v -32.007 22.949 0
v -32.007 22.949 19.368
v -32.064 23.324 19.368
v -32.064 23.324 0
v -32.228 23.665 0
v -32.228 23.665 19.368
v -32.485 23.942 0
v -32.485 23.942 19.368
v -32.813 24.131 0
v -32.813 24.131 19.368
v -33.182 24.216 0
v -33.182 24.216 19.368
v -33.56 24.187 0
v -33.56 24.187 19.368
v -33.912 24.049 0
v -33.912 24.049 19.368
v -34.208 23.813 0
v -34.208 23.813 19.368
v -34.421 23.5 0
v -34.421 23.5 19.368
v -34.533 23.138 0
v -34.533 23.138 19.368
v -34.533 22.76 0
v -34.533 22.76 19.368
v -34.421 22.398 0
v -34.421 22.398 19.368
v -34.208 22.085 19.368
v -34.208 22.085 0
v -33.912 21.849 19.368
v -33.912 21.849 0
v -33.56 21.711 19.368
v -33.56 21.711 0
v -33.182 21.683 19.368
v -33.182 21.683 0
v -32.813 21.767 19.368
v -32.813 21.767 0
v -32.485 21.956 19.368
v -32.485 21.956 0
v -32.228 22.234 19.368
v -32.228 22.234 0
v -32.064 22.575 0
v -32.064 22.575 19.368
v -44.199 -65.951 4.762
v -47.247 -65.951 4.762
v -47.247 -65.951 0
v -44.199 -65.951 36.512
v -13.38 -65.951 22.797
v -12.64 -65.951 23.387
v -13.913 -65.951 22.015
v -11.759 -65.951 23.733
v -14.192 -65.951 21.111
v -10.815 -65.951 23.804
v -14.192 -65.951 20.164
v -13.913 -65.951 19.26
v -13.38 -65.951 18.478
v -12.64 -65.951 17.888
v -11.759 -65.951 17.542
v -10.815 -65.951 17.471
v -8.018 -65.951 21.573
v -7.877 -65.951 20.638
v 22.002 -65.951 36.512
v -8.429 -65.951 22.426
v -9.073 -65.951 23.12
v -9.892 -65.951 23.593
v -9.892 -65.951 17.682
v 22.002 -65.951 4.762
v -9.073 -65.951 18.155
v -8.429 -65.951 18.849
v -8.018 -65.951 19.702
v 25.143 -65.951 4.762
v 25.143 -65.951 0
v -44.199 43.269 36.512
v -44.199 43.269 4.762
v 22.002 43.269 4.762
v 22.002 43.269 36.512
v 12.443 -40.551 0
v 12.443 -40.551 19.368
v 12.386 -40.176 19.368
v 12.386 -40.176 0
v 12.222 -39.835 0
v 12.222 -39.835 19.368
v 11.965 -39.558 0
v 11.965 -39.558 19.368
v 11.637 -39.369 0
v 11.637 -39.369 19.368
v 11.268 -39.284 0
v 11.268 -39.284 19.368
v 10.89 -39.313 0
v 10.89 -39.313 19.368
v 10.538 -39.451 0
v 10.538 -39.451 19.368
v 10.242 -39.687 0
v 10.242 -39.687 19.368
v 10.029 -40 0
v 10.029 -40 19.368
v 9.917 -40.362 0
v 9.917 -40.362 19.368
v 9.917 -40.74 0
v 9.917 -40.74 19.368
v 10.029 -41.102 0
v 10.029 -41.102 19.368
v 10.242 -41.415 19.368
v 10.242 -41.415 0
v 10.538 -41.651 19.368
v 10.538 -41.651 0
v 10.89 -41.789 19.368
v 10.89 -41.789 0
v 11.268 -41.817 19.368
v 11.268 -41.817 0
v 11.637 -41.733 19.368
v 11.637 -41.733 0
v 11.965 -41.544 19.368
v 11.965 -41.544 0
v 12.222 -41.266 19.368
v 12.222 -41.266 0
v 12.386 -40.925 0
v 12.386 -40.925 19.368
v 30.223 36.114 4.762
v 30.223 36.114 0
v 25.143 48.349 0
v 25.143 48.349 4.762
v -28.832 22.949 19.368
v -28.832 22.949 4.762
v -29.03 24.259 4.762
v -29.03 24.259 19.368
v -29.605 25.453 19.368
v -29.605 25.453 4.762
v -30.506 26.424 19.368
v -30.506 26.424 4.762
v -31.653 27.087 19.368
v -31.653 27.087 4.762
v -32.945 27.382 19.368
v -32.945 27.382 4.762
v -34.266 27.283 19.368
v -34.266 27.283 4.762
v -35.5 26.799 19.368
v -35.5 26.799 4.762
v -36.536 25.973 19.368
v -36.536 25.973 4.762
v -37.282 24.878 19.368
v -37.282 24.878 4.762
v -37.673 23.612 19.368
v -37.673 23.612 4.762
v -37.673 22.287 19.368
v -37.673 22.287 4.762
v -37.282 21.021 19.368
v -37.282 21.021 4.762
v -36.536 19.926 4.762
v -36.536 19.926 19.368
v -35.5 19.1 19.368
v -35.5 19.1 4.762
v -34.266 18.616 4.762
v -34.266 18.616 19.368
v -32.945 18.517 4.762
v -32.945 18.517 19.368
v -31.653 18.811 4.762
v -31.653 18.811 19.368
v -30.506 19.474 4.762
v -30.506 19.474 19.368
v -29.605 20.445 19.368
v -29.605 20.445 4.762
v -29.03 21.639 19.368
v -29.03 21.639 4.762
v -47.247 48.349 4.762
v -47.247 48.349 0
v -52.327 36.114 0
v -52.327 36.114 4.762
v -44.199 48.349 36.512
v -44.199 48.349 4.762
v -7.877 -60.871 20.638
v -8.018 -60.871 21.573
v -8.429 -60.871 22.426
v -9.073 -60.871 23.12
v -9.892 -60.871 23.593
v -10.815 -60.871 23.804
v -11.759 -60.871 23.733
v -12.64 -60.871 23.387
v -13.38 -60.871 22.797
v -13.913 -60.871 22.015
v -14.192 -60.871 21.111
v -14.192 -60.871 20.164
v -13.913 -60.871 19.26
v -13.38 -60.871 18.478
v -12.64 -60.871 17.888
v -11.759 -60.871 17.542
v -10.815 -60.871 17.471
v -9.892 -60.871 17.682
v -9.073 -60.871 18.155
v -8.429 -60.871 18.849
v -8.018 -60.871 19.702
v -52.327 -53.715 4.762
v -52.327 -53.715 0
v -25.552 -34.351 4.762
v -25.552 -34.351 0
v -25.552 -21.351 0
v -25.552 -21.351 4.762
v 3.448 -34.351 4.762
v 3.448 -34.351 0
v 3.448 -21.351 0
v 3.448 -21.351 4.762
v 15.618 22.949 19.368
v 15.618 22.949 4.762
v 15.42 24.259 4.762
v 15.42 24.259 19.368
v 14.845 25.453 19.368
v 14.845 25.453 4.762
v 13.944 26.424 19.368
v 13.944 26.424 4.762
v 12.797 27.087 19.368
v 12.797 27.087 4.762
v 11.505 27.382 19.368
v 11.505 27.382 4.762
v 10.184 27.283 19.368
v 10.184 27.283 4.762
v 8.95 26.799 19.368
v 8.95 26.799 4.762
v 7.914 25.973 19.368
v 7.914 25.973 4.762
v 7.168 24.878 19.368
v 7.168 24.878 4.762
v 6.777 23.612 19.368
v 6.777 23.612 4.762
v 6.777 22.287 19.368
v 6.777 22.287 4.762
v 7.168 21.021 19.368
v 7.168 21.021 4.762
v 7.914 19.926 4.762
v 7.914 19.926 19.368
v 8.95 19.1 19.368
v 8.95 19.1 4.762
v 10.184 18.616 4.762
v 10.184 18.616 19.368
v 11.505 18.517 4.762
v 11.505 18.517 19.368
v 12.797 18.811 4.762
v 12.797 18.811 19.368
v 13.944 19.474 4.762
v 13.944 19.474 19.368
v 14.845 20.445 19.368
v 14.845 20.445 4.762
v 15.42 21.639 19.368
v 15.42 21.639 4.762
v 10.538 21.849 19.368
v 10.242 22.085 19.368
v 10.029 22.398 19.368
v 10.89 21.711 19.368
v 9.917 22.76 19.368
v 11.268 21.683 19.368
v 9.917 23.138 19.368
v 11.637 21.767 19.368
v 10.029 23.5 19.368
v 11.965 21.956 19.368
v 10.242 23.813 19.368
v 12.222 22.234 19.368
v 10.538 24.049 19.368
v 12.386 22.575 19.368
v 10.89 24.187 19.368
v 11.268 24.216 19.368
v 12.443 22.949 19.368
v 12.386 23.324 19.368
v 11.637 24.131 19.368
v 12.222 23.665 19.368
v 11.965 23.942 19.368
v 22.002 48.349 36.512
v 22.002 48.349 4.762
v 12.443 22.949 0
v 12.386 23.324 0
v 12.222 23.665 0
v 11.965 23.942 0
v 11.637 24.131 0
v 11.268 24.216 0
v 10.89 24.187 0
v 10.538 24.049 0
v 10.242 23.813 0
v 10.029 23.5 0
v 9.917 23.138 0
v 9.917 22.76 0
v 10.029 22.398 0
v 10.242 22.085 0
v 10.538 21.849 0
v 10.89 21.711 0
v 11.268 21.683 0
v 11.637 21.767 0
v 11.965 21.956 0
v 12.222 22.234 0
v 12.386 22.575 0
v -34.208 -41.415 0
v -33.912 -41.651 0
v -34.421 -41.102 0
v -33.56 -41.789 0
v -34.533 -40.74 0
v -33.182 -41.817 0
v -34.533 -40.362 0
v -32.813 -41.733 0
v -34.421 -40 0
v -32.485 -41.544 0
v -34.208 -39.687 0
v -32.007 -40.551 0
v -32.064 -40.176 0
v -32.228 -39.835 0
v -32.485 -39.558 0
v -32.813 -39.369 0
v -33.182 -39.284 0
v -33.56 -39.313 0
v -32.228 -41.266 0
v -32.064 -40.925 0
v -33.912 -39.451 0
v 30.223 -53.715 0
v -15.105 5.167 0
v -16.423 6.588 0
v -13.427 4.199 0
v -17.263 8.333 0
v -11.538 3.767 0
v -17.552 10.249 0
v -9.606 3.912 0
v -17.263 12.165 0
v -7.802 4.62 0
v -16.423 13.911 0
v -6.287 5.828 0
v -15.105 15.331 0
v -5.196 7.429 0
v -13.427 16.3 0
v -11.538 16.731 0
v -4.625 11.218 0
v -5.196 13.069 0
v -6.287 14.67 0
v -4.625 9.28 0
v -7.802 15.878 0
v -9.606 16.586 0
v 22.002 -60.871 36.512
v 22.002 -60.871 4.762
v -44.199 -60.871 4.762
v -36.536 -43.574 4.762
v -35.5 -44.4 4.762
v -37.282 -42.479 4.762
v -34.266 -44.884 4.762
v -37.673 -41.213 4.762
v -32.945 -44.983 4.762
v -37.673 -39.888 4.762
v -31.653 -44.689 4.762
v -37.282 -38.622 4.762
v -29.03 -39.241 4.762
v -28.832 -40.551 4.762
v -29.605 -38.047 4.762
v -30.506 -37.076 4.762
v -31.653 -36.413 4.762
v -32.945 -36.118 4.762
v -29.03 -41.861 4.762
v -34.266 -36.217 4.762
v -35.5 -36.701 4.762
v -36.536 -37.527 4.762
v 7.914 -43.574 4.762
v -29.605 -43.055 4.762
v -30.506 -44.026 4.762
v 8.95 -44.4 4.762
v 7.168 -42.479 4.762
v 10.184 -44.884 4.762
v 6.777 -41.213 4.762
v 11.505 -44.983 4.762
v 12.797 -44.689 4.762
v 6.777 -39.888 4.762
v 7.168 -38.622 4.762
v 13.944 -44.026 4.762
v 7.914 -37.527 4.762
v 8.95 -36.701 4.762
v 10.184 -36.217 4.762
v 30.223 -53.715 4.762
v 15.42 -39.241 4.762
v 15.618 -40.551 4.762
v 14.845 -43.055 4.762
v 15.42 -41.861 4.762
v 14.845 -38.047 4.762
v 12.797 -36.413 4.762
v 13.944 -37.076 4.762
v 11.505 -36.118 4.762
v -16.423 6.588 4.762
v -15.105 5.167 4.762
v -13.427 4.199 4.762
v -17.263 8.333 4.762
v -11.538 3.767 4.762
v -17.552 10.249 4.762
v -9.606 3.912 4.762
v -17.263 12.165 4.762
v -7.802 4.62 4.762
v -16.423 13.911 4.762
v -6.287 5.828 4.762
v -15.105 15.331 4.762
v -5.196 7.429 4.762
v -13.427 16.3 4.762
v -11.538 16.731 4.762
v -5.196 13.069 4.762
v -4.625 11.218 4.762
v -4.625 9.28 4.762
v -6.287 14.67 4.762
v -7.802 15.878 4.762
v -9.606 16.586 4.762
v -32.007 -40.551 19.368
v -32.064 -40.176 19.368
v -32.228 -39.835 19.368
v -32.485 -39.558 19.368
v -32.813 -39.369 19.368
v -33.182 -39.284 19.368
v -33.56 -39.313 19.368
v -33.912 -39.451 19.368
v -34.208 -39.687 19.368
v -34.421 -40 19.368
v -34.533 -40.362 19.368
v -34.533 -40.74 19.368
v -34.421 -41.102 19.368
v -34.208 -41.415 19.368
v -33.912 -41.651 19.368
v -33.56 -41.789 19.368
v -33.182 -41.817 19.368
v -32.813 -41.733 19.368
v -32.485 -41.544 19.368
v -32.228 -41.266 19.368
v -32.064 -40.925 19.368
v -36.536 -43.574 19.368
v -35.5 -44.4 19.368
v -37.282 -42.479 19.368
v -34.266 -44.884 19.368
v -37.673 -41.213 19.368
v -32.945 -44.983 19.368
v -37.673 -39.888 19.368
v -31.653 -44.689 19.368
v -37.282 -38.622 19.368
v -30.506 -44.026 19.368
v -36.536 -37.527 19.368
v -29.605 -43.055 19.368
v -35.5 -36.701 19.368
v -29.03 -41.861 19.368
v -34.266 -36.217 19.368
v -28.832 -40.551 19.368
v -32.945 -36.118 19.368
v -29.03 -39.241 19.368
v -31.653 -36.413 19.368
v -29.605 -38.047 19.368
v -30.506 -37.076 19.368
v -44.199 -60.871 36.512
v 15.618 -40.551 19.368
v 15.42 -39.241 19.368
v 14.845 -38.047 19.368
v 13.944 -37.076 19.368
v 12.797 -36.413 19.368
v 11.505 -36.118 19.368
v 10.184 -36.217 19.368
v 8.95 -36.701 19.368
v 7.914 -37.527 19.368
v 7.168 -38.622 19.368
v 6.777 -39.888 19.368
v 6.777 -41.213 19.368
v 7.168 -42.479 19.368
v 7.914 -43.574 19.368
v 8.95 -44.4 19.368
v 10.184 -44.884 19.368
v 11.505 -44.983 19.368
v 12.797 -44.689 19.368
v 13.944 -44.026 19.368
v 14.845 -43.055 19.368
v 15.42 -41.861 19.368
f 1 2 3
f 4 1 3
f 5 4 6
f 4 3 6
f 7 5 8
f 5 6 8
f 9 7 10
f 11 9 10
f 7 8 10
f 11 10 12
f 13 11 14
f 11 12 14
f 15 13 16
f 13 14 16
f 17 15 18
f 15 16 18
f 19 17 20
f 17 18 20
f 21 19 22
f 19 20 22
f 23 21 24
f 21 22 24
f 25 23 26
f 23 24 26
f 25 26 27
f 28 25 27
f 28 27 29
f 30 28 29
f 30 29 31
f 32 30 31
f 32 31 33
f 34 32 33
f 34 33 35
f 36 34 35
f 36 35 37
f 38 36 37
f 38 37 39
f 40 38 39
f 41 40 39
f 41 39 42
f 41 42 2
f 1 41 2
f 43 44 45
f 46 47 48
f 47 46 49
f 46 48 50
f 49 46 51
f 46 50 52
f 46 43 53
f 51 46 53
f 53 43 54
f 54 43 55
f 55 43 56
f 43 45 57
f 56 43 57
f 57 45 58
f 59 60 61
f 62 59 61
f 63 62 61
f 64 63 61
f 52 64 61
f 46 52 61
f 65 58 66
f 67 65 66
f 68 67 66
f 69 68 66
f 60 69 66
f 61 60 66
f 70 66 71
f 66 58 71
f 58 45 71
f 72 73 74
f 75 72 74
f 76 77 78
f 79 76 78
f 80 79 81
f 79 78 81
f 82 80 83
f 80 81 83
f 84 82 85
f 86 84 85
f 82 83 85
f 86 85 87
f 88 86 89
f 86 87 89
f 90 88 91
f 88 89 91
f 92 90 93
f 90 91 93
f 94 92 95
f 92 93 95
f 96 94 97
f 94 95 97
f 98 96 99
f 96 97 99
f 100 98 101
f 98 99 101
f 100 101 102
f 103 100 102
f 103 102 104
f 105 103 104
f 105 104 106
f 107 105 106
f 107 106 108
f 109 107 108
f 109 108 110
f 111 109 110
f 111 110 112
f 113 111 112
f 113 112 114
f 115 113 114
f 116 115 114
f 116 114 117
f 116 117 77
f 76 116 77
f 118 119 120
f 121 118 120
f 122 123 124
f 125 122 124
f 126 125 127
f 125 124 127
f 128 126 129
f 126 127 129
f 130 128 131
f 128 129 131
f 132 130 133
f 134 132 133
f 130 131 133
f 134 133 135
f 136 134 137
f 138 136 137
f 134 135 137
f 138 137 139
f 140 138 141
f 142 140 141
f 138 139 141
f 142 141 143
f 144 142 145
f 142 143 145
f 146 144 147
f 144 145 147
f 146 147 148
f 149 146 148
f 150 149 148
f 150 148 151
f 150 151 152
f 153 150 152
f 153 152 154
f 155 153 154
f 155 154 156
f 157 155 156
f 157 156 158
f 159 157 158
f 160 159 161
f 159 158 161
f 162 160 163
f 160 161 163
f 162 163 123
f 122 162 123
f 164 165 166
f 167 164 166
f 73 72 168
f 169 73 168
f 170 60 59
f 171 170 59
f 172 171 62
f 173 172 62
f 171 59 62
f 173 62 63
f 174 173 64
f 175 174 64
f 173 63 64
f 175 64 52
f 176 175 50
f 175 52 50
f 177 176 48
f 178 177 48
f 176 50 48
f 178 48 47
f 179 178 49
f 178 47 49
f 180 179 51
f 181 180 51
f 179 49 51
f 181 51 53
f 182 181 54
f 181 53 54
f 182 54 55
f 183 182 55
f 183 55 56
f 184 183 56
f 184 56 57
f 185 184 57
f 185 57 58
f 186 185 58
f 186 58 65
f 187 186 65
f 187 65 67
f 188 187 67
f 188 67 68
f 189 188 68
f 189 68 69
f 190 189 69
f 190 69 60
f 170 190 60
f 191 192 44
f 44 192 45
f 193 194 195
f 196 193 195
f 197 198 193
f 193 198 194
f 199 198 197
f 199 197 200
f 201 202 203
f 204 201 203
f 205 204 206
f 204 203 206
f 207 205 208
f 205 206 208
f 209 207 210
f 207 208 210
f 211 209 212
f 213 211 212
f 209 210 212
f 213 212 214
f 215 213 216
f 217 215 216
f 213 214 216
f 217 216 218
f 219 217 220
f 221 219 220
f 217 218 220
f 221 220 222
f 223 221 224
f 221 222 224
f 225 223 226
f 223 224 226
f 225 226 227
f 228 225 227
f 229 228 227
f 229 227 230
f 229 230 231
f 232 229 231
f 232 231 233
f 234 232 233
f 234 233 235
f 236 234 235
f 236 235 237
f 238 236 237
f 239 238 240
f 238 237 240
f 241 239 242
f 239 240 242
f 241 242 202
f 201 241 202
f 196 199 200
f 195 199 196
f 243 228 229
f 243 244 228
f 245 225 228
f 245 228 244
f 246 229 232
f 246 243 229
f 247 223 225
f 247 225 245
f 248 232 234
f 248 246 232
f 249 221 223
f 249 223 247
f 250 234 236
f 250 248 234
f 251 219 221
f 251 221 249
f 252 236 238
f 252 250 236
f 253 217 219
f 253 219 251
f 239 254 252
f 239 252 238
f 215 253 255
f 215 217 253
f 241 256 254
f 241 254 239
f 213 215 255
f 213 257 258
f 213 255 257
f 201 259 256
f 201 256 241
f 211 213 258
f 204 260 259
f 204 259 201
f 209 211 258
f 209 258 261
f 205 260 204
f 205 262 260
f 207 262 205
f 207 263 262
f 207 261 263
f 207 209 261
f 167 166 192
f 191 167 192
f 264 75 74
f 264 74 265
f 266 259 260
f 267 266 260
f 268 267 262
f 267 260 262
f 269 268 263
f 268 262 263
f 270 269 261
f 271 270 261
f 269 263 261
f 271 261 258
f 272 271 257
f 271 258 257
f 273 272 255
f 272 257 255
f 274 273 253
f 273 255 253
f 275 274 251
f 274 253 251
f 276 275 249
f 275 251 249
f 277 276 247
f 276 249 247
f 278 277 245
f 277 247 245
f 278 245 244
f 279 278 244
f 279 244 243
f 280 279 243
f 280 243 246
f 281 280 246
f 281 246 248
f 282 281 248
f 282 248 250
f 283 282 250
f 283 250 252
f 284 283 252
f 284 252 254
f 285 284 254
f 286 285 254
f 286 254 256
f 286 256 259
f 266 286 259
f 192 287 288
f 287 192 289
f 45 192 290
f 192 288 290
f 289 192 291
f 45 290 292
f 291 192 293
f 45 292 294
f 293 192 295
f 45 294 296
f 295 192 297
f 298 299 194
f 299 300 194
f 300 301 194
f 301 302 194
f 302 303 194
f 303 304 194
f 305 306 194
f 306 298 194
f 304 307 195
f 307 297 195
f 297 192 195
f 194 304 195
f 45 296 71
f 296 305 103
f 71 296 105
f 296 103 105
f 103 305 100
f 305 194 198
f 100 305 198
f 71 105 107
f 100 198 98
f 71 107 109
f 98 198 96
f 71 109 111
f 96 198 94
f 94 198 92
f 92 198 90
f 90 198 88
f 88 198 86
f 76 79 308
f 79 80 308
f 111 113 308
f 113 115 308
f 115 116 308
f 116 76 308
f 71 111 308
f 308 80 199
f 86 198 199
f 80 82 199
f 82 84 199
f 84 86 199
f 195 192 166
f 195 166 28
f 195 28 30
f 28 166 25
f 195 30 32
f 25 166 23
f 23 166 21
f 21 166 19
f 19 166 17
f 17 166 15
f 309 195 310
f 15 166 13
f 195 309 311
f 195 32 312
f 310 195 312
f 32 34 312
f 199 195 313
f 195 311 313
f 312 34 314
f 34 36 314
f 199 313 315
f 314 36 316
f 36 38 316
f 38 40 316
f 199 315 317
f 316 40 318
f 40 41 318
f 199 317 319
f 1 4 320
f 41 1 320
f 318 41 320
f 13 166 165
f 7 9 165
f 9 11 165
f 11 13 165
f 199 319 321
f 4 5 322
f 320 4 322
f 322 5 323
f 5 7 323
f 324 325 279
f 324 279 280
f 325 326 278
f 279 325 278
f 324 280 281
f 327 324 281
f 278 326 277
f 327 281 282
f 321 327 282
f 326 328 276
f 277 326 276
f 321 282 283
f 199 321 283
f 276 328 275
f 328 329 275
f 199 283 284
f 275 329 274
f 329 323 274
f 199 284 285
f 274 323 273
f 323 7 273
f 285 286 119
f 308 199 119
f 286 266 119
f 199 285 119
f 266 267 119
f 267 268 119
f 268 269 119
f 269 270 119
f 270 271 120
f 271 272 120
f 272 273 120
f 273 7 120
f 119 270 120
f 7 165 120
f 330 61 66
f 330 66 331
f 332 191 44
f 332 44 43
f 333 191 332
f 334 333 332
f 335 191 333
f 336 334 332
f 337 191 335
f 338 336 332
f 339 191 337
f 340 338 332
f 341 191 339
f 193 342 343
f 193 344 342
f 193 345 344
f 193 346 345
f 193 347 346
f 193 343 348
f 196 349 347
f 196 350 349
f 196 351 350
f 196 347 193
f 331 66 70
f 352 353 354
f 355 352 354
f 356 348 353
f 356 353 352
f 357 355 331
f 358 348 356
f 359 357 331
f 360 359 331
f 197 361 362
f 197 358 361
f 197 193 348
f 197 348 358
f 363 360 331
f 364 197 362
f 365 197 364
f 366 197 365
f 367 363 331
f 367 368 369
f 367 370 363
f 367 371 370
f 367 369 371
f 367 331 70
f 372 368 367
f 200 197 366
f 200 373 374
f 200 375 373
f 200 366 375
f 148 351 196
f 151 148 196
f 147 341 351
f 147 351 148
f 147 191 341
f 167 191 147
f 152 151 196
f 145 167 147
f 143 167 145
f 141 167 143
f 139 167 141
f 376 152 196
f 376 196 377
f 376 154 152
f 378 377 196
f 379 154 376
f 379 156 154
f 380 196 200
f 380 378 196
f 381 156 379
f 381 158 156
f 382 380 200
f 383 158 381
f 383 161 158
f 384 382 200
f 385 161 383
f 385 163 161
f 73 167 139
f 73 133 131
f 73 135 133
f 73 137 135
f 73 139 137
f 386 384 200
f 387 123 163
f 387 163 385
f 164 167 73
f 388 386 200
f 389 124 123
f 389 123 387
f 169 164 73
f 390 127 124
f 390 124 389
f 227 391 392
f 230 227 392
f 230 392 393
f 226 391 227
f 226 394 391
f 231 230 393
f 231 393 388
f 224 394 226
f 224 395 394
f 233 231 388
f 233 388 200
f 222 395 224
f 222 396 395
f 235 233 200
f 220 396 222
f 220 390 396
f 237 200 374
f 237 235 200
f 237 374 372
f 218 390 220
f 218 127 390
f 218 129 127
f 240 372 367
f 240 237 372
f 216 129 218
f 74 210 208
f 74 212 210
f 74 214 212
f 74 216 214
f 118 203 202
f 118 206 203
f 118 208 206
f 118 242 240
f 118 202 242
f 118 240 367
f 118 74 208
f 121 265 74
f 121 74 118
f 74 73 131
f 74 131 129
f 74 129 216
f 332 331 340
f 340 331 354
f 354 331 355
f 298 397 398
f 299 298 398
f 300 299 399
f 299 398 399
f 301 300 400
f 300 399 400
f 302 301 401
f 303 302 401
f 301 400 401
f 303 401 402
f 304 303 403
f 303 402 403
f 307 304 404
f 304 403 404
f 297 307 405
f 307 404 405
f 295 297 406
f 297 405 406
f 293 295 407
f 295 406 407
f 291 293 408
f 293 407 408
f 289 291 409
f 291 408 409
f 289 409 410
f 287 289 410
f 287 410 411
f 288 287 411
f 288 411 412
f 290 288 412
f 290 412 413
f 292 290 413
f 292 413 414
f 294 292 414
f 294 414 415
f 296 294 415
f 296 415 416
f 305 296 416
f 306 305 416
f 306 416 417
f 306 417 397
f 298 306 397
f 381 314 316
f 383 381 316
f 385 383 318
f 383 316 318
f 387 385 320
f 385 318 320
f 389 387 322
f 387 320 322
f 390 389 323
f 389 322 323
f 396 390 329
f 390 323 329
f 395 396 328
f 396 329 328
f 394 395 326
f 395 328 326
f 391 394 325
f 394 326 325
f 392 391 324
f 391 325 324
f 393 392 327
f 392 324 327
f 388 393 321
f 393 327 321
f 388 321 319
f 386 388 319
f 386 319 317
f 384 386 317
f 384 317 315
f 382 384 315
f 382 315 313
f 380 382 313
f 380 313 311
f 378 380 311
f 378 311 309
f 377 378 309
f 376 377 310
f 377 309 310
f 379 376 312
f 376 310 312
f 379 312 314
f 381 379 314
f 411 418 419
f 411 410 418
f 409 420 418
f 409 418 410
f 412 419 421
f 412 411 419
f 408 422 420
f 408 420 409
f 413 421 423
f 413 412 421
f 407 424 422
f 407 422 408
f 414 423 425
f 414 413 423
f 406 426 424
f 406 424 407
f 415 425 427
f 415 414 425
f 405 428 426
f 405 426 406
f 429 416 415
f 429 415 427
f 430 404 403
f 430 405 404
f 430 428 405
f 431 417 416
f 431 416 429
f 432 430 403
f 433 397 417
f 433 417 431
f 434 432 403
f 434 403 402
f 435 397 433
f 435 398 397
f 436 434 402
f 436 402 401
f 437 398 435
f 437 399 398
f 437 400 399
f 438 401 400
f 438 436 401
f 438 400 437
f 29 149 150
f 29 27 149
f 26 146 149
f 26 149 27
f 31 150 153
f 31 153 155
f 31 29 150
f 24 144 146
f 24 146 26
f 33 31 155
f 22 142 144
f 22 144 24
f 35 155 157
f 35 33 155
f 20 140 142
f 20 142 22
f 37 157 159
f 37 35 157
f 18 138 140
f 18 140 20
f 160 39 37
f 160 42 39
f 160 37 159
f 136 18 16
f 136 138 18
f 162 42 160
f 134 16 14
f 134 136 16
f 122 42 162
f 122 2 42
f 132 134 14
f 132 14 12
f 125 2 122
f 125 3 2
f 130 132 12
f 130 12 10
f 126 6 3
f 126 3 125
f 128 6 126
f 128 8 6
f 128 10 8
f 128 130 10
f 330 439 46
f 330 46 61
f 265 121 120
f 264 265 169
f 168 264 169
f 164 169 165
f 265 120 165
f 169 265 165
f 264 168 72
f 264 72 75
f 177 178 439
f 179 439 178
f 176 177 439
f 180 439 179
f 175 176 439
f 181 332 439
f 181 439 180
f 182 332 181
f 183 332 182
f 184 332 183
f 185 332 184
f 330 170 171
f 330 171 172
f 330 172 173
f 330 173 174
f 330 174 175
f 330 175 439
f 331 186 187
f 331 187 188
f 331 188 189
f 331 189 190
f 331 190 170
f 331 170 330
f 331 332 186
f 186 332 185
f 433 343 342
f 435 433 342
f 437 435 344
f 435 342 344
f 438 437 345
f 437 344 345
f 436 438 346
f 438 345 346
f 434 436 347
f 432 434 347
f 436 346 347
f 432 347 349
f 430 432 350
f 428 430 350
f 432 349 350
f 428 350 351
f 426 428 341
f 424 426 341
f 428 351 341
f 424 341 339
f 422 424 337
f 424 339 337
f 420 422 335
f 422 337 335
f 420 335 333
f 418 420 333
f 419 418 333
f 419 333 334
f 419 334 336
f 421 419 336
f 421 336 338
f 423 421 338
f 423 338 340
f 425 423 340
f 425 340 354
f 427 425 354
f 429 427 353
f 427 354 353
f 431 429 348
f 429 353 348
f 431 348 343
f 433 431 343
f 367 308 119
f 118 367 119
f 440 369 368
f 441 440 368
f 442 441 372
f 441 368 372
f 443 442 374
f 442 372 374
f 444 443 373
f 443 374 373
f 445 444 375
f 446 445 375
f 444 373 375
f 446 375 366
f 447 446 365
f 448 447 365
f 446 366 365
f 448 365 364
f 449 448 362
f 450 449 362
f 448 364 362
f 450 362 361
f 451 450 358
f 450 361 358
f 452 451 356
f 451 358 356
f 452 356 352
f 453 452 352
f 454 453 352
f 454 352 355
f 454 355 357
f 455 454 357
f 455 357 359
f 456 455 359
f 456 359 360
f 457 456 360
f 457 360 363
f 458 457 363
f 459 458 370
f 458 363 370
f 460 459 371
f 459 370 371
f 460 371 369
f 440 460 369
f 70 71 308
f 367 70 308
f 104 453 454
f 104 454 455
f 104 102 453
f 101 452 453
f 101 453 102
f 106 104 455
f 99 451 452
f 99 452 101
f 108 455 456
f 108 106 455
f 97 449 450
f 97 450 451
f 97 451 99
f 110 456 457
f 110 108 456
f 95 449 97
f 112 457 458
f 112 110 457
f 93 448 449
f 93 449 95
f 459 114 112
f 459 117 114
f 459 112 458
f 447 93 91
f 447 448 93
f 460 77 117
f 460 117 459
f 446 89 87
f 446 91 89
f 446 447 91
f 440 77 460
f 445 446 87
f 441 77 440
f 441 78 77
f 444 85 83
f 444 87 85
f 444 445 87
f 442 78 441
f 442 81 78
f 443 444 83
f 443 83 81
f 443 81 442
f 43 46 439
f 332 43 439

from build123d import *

# Parameters (mm, degrees)
BOSS_EXTRUDE1_DEPTH = 4.7625
SKETCH3_W           = 66.200858932
SKETCH3_H           = 5.079818348
BOSS_EXTRUDE2_DEPTH = 31.75
SKETCH4_W           = 28.999942
SKETCH4_H           = 12.9999994
CUT_EXTRUDE1_DEPTH  = 4.7625
SKETCH5_R           = 6.4999997
CUT_EXTRUDE2_DEPTH  = 4.7625
SKETCH6_R           = 3.175
CUT_EXTRUDE3_DEPTH  = 7.3025
SKETCH7_R           = 4.445
BOSS_EXTRUDE3_DEPTH = 14.605
SKETCH8_R           = 1.27
CUT_EXTRUDE4_DEPTH  = 50.8


with BuildPart() as part:
    # Sketch1 → Boss-Extrude1 (new body)
    with BuildSketch(Plane.XY):
        Polygon((30.222809818, 36.11360466), (25.142809818, 48.349181892), (-47.247190182, 48.349181892), (-52.327190182, 36.11360466), (-52.327190182, -53.715240876), (-47.247190182, -65.950818108), (25.142809818, -65.950818108), (30.222809818, -53.715240876), align=None)
    extrude(amount=BOSS_EXTRUDE1_DEPTH)

    # Sketch3 → Boss-Extrude2 (add)
    with BuildSketch(Plane.XY.offset(4.7625)):
        with Locations((-11.098760716, 45.809272718)):
            Rectangle(SKETCH3_W, SKETCH3_H)
        with Locations((-11.098760716, -63.410908934)):
            Rectangle(SKETCH3_W, SKETCH3_H)
    extrude(amount=BOSS_EXTRUDE2_DEPTH)

    # Sketch4 → Cut-Extrude1 (cut)
    with BuildSketch(Plane(origin=(0, 0, 0), x_dir=(-1, 0, 0), z_dir=(0, 0, -1))):
        with Locations((11.052190182, -27.850818108)):
            Rectangle(SKETCH4_W, SKETCH4_H)
    extrude(amount=-CUT_EXTRUDE1_DEPTH, mode=Mode.SUBTRACT)

    # Sketch5 → Cut-Extrude2 (cut)
    with BuildSketch(Plane(origin=(0, 0, 0), x_dir=(-1, 0, 0), z_dir=(0, 0, -1))):
        with Locations((11.052190182, 10.249181892)):
            Circle(SKETCH5_R)
    extrude(amount=-CUT_EXTRUDE2_DEPTH, mode=Mode.SUBTRACT)

    # Sketch6 → Cut-Extrude3 (cut)
    with BuildSketch(Plane.XZ.offset(65.950818108)):
        with Locations((-11.052190182, 20.6375)):
            Circle(SKETCH6_R)
    extrude(amount=-CUT_EXTRUDE3_DEPTH, mode=Mode.SUBTRACT)

    # Sketch7 → Boss-Extrude3 (add)
    with BuildSketch(Plane.XY.offset(4.7625)):
        with Locations((11.172809818, -40.550818108)):
            Circle(SKETCH7_R)
        with Locations((-33.277190182, -40.550818108)):
            Circle(SKETCH7_R)
        with Locations((11.172809818, 22.949181892)):
            Circle(SKETCH7_R)
        with Locations((-33.277190182, 22.949181892)):
            Circle(SKETCH7_R)
    extrude(amount=BOSS_EXTRUDE3_DEPTH)

    # Sketch8 → Cut-Extrude4 (cut)
    with BuildSketch(Plane.XY.offset(19.3675)):
        with Locations((-33.277190182, 22.949181892)):
            Circle(SKETCH8_R)
        with Locations((11.172809818, 22.949181892)):
            Circle(SKETCH8_R)
        with Locations((11.172809818, -40.550818108)):
            Circle(SKETCH8_R)
        with Locations((-33.277190182, -40.550818108)):
            Circle(SKETCH8_R)
    extrude(amount=-CUT_EXTRUDE4_DEPTH, mode=Mode.SUBTRACT)


solid = part.part
